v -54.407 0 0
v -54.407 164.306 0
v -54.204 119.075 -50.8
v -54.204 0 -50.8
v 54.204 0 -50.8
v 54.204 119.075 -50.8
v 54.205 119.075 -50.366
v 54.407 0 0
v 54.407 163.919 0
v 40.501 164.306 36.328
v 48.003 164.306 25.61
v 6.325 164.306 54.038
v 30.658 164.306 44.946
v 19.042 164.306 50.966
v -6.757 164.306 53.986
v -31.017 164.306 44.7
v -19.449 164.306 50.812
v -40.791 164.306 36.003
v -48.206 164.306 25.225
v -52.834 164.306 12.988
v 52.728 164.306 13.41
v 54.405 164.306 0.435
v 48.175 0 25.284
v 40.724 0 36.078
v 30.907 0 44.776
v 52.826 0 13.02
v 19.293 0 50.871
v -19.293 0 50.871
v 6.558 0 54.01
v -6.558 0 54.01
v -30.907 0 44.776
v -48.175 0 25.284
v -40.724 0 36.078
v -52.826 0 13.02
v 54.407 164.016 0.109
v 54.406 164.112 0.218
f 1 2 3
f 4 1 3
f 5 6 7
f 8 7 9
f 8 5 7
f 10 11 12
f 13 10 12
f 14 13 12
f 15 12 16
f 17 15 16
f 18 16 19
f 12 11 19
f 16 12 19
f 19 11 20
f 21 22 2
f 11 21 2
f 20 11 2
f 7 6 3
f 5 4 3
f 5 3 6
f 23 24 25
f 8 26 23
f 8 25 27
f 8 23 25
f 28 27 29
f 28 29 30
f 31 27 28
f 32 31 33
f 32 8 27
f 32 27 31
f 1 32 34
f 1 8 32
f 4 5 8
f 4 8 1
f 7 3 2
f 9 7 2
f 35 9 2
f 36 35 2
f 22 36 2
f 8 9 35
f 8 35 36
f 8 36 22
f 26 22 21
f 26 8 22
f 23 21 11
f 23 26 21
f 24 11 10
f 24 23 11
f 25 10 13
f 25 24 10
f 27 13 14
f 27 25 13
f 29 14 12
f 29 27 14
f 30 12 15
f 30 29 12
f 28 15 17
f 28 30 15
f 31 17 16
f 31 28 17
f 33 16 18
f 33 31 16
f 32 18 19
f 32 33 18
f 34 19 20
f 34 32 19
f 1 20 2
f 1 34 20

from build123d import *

# Parameters (mm, degrees)
BOSS_EXTRUDE1_DEPTH = 164.30625
CUT_EXTRUDE1_DEPTH  = 205.500810654
CUT_EXTRUDE2_DEPTH  = 205.500810654


with BuildPart() as part:
    # Sketch3 → Boss-Extrude1 (new body)
    with BuildSketch(Plane(origin=(0, 0, 0), x_dir=(1, 0, 0), z_dir=(0, 1, 0))):
        with BuildLine():
            Line((-54.2036, 50.8), (-54.4068, 0))
            ThreePointArc((-54.4068, 0), (0, -54.4068), (54.4068, 0))
            Line((54.4068, 0), (54.2036, 50.8))
            Line((54.2036, 50.8), (-54.2036, 50.8))
        make_face()
    extrude(amount=BOSS_EXTRUDE1_DEPTH)

    # Sketch6 → Cut-Extrude1 (cut, through all)
    with BuildSketch(Plane(origin=(-54.405929505, 0, -0.217623718), x_dir=(-0.003999968000384008, 0, 0.9999920000959988), z_dir=(-0.9999920000959988, 0, -0.003999968000384008))):
        Polygon((-50.582780939, 119.0752), (0.217625459, 164.30625), (-50.582780939, 164.30625), align=None)
    extrude(amount=-CUT_EXTRUDE1_DEPTH, mode=Mode.SUBTRACT)

    # Sketch6<3> → Cut-Extrude2 (cut, through all)
    with BuildSketch(Plane(origin=(-54.405929505, 0, -0.217623718), x_dir=(-0.003999968000384008, 0, 0.9999920000959988), z_dir=(-0.9999920000959988, 0, -0.003999968000384008))):
        Polygon((-50.582780939, 119.0752), (0.217625459, 164.30625), (0.217625459, 170.743194309), (-79.741095166, 170.743194309), (-79.741095166, 119.0752), align=None)
    extrude(amount=-CUT_EXTRUDE2_DEPTH, mode=Mode.SUBTRACT)


solid = part.part
